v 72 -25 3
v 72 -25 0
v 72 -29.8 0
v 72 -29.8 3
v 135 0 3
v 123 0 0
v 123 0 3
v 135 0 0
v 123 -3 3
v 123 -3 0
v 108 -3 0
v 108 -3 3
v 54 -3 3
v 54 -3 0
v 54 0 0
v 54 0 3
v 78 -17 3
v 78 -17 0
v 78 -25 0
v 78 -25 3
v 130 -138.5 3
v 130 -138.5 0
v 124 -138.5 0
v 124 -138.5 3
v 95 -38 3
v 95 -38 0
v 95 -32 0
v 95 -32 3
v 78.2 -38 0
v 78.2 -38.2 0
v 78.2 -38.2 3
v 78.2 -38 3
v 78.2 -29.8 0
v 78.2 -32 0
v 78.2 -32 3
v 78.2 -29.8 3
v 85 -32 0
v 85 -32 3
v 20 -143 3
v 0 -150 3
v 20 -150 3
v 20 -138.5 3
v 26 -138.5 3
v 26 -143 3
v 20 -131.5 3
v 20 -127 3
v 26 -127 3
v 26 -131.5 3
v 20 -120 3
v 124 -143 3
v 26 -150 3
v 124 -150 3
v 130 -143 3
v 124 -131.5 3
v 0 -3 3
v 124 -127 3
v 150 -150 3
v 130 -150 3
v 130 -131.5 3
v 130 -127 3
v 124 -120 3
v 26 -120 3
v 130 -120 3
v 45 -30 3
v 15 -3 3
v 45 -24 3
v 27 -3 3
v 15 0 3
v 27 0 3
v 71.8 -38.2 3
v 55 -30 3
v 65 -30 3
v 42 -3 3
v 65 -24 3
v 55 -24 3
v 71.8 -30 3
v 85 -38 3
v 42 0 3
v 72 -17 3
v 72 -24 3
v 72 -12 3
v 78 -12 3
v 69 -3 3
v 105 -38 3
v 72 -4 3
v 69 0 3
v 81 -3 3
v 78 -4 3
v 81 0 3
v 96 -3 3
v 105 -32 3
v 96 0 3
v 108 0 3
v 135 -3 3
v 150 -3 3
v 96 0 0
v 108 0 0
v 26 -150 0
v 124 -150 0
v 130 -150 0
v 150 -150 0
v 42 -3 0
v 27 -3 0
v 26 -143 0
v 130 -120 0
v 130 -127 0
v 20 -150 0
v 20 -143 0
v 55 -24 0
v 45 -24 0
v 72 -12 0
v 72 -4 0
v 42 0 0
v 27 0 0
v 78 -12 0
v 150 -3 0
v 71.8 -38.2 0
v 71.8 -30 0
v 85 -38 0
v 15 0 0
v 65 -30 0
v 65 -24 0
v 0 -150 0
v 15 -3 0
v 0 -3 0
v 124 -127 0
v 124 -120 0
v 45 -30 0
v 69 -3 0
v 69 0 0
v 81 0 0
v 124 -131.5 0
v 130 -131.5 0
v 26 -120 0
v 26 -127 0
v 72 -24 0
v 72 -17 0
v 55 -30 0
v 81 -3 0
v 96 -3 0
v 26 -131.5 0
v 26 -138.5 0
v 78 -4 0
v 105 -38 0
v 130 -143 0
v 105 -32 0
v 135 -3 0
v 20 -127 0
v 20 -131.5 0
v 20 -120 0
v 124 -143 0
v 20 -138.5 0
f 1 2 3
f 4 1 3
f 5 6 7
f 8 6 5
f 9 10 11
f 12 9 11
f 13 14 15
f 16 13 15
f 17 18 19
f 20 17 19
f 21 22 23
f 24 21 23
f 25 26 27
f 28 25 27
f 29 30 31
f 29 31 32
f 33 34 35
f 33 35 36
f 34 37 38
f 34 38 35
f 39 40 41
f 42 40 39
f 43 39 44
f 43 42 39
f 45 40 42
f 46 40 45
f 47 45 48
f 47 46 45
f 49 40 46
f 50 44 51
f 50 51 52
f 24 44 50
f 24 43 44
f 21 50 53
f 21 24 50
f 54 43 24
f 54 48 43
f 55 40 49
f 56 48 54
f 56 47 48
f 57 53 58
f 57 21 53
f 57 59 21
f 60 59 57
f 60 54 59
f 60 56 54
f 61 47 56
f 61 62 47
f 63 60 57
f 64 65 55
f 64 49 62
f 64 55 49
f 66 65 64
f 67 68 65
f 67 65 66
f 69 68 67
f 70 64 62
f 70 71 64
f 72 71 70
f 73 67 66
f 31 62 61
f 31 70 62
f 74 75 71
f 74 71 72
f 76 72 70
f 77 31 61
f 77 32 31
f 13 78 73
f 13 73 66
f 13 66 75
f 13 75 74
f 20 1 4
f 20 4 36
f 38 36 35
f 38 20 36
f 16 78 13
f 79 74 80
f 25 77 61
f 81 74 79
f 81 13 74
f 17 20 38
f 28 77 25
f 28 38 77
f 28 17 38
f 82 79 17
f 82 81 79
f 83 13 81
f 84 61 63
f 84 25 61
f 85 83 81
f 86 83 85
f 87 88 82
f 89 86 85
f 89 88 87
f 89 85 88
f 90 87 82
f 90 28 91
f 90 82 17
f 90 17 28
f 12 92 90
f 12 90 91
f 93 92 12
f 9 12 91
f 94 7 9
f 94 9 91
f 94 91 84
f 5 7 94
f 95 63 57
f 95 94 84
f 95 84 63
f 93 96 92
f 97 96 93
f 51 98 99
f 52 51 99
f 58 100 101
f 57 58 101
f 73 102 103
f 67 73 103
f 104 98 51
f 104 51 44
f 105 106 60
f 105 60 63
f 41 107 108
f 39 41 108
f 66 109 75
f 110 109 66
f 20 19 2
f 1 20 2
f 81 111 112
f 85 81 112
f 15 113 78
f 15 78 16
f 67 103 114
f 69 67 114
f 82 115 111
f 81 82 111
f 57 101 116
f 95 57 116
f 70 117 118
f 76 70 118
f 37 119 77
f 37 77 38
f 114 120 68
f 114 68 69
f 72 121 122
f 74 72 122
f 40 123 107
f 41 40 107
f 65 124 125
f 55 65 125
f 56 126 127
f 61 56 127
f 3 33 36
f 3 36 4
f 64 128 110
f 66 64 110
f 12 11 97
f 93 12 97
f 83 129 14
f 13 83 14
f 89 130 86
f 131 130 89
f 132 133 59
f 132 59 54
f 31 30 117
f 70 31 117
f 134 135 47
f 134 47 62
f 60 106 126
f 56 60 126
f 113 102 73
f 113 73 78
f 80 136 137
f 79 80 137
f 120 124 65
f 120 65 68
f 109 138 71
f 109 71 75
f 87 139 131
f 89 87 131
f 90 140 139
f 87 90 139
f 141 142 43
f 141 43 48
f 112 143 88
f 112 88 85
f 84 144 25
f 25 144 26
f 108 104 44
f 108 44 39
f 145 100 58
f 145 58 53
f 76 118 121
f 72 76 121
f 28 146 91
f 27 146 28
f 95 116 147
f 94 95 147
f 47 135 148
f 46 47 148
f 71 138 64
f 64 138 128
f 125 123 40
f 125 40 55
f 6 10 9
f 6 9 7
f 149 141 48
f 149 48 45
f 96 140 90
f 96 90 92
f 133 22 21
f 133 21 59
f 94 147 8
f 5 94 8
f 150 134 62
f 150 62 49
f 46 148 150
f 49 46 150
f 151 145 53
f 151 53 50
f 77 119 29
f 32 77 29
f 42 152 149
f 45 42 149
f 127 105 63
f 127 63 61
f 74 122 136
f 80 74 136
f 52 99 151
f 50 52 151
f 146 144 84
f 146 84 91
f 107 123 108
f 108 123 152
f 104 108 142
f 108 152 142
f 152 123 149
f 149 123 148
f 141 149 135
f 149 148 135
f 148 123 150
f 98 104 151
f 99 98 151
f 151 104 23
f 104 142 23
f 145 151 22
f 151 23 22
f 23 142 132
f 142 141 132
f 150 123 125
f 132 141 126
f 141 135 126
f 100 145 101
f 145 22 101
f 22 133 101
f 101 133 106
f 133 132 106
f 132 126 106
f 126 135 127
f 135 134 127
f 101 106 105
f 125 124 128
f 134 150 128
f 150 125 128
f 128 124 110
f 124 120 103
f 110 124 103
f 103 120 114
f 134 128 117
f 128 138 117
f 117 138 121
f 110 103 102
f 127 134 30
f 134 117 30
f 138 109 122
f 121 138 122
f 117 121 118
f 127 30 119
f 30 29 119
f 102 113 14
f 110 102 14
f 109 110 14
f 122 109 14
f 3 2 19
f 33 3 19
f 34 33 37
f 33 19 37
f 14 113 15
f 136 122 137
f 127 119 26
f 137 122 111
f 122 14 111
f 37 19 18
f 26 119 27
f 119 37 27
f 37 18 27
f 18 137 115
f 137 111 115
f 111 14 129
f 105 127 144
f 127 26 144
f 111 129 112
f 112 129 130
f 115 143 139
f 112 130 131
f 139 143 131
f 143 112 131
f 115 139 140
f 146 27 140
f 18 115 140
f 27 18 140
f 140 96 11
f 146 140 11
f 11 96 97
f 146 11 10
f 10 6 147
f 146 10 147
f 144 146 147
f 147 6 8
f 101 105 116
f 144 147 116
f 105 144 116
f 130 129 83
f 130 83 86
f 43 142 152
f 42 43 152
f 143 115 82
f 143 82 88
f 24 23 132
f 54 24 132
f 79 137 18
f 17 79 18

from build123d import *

# Parameters (mm, degrees)
ESQUISSE1_W              = 150
ESQUISSE1_H              = 150
BOSS_EXTRU_1_DEPTH       = 3
ESQUISSE12_W             = 6
ESQUISSE12_H             = 7
ENL_V_MAT_EXTRU_3_DEPTH  = 3
ESQUISSE14_W             = 15
ESQUISSE14_H             = 3
ENL_V_MAT_EXTRU_4_DEPTH  = 3
ESQUISSE15_W             = 10
ESQUISSE15_H             = 6
ESQUISSE15_W_2           = 6
ESQUISSE15_H_2           = 8
ESQUISSE15_W_3           = 7
ENL_V_MAT_EXTRU_9_DEPTH  = 10
ESQUISSE17_W             = 6.4
ESQUISSE17_H             = 8.4
ENL_V_MAT_EXTRU_12_DEPTH = 10


with BuildPart() as part:
    # Esquisse1 → Boss.-Extru.1 (new body)
    with BuildSketch(Plane.XY):
        with Locations((75, -75)):
            Rectangle(ESQUISSE1_W, ESQUISSE1_H)
    extrude(amount=BOSS_EXTRU_1_DEPTH)

    # Esquisse12 → Enlèv. mat.-Extru.3 (cut)
    with BuildSketch(Plane(origin=(0, 0, 0), x_dir=(-1, 0, 0), z_dir=(0, 0, -1))):
        with Locations((-127, -123.5)):
            Rectangle(ESQUISSE12_W, ESQUISSE12_H)
        with Locations((-127, -135)):
            Rectangle(ESQUISSE12_W, ESQUISSE12_H)
        with Locations((-127, -146.5)):
            Rectangle(ESQUISSE12_W, ESQUISSE12_H)
        with Locations((-23, -123.5)):
            Rectangle(ESQUISSE12_W, ESQUISSE12_H)
        with Locations((-23, -135)):
            Rectangle(ESQUISSE12_W, ESQUISSE12_H)
        with Locations((-23, -146.5)):
            Rectangle(ESQUISSE12_W, ESQUISSE12_H)
    extrude(amount=-ENL_V_MAT_EXTRU_3_DEPTH, mode=Mode.SUBTRACT)

    # Esquisse14 → Enlèv. mat.-Extru.4 (cut)
    with BuildSketch(Plane(origin=(0, 0, 0), x_dir=(-1, 0, 0), z_dir=(0, 0, -1))):
        with Locations((-142.5, -1.5)):
            Rectangle(ESQUISSE14_W, ESQUISSE14_H)
        with Locations((-115.5, -1.5)):
            Rectangle(ESQUISSE14_W, ESQUISSE14_H)
        with Locations((-88.5, -1.5)):
            Rectangle(ESQUISSE14_W, ESQUISSE14_H)
        with Locations((-61.5, -1.5)):
            Rectangle(ESQUISSE14_W, ESQUISSE14_H)
        with Locations((-34.5, -1.5)):
            Rectangle(ESQUISSE14_W, ESQUISSE14_H)
        with Locations((-7.5, -1.5)):
            Rectangle(ESQUISSE14_W, ESQUISSE14_H)
    extrude(amount=-ENL_V_MAT_EXTRU_4_DEPTH, mode=Mode.SUBTRACT)

    # Esquisse15 → Enlèv. mat.-Extru.9 (cut)
    with BuildSketch(Plane(origin=(0, 0, 0), x_dir=(-1, 0, 0), z_dir=(0, 0, -1))):
        with Locations((-50, -27)):
            Rectangle(ESQUISSE15_W, ESQUISSE15_H)
        Polygon((-78, -17), (-78, -25), (-72, -25), (-72, -30), (-65, -30), (-65, -24), (-72, -24), (-72, -17), align=None)
        with Locations((-75, -8)):
            Rectangle(ESQUISSE15_W_2, ESQUISSE15_H_2)
        with Locations((-81.5, -35)):
            Rectangle(ESQUISSE15_W_3, ESQUISSE15_H)
        with Locations((-100, -35)):
            Rectangle(ESQUISSE15_W, ESQUISSE15_H)
    extrude(amount=-ENL_V_MAT_EXTRU_9_DEPTH, mode=Mode.SUBTRACT)

    # Esquisse17 → Enlèv. mat.-Extru.12 (cut)
    with BuildSketch(Plane(origin=(0, 0, 0), x_dir=(-1, 0, 0), z_dir=(0, 0, -1))):
        with Locations((-75, -34)):
            Rectangle(ESQUISSE17_W, ESQUISSE17_H)
    extrude(amount=-ENL_V_MAT_EXTRU_12_DEPTH, mode=Mode.SUBTRACT)


solid = part.part
